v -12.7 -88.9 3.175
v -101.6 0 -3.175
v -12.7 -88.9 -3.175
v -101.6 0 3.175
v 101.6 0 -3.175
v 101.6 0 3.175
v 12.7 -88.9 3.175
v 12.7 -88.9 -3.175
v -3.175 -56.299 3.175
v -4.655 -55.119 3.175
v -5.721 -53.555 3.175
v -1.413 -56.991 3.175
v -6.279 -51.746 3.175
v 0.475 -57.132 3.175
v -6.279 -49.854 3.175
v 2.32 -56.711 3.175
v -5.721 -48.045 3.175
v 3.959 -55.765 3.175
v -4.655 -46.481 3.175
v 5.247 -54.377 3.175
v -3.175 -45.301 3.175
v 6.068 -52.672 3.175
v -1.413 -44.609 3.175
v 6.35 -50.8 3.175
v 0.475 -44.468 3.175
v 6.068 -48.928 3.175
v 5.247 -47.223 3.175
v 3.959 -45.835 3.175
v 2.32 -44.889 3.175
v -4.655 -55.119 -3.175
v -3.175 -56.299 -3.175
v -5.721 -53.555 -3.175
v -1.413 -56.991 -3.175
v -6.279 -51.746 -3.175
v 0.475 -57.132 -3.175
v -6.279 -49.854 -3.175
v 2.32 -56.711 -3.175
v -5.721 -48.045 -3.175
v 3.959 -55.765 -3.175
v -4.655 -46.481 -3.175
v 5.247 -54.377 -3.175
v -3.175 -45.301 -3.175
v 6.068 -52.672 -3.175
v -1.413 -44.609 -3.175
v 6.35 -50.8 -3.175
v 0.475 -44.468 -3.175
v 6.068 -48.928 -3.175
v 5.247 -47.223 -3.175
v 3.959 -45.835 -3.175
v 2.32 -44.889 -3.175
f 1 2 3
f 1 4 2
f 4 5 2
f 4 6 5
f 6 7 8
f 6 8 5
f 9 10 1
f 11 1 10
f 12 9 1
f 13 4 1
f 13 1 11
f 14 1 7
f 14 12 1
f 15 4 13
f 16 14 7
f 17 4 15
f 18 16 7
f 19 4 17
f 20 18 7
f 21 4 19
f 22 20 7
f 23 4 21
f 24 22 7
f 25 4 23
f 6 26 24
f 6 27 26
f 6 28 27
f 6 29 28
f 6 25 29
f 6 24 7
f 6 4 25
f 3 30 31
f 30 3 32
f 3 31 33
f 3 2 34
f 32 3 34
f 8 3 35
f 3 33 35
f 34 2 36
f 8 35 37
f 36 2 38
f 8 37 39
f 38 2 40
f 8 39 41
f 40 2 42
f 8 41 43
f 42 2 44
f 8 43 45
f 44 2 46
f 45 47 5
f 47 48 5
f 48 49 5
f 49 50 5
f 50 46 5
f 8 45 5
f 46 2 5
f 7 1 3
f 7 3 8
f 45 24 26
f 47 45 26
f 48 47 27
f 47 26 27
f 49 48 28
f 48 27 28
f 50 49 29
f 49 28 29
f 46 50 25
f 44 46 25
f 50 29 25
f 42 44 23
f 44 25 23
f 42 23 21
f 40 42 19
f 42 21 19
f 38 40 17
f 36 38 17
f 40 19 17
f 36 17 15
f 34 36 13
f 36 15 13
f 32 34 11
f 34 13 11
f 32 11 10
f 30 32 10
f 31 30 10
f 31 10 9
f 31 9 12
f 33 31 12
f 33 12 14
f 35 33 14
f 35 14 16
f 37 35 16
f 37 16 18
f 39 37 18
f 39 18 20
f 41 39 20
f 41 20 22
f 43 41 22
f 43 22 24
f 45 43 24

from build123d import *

# Parameters (mm, degrees)
BOSS_EXTRUDE1_DEPTH = 3.175
SKETCH2_R           = 6.35
CUT_EXTRUDE1_DEPTH  = 136.152108752


with BuildPart() as part:
    # Sketch1 → Boss-Extrude1 (new, symmetric)
    with BuildSketch(Plane.XY):
        Polygon((-101.6, 0), (-12.7, -88.9), (12.7, -88.9), (101.6, 0), align=None)
    extrude(amount=BOSS_EXTRUDE1_DEPTH, both=True)

    # Sketch2 → Cut-Extrude1 (cut, through all)
    with BuildSketch(Plane.XY.offset(3.175)):
        with Locations((0, -50.8)):
            Circle(SKETCH2_R)
    extrude(amount=-CUT_EXTRUDE1_DEPTH, mode=Mode.SUBTRACT)


solid = part.part
